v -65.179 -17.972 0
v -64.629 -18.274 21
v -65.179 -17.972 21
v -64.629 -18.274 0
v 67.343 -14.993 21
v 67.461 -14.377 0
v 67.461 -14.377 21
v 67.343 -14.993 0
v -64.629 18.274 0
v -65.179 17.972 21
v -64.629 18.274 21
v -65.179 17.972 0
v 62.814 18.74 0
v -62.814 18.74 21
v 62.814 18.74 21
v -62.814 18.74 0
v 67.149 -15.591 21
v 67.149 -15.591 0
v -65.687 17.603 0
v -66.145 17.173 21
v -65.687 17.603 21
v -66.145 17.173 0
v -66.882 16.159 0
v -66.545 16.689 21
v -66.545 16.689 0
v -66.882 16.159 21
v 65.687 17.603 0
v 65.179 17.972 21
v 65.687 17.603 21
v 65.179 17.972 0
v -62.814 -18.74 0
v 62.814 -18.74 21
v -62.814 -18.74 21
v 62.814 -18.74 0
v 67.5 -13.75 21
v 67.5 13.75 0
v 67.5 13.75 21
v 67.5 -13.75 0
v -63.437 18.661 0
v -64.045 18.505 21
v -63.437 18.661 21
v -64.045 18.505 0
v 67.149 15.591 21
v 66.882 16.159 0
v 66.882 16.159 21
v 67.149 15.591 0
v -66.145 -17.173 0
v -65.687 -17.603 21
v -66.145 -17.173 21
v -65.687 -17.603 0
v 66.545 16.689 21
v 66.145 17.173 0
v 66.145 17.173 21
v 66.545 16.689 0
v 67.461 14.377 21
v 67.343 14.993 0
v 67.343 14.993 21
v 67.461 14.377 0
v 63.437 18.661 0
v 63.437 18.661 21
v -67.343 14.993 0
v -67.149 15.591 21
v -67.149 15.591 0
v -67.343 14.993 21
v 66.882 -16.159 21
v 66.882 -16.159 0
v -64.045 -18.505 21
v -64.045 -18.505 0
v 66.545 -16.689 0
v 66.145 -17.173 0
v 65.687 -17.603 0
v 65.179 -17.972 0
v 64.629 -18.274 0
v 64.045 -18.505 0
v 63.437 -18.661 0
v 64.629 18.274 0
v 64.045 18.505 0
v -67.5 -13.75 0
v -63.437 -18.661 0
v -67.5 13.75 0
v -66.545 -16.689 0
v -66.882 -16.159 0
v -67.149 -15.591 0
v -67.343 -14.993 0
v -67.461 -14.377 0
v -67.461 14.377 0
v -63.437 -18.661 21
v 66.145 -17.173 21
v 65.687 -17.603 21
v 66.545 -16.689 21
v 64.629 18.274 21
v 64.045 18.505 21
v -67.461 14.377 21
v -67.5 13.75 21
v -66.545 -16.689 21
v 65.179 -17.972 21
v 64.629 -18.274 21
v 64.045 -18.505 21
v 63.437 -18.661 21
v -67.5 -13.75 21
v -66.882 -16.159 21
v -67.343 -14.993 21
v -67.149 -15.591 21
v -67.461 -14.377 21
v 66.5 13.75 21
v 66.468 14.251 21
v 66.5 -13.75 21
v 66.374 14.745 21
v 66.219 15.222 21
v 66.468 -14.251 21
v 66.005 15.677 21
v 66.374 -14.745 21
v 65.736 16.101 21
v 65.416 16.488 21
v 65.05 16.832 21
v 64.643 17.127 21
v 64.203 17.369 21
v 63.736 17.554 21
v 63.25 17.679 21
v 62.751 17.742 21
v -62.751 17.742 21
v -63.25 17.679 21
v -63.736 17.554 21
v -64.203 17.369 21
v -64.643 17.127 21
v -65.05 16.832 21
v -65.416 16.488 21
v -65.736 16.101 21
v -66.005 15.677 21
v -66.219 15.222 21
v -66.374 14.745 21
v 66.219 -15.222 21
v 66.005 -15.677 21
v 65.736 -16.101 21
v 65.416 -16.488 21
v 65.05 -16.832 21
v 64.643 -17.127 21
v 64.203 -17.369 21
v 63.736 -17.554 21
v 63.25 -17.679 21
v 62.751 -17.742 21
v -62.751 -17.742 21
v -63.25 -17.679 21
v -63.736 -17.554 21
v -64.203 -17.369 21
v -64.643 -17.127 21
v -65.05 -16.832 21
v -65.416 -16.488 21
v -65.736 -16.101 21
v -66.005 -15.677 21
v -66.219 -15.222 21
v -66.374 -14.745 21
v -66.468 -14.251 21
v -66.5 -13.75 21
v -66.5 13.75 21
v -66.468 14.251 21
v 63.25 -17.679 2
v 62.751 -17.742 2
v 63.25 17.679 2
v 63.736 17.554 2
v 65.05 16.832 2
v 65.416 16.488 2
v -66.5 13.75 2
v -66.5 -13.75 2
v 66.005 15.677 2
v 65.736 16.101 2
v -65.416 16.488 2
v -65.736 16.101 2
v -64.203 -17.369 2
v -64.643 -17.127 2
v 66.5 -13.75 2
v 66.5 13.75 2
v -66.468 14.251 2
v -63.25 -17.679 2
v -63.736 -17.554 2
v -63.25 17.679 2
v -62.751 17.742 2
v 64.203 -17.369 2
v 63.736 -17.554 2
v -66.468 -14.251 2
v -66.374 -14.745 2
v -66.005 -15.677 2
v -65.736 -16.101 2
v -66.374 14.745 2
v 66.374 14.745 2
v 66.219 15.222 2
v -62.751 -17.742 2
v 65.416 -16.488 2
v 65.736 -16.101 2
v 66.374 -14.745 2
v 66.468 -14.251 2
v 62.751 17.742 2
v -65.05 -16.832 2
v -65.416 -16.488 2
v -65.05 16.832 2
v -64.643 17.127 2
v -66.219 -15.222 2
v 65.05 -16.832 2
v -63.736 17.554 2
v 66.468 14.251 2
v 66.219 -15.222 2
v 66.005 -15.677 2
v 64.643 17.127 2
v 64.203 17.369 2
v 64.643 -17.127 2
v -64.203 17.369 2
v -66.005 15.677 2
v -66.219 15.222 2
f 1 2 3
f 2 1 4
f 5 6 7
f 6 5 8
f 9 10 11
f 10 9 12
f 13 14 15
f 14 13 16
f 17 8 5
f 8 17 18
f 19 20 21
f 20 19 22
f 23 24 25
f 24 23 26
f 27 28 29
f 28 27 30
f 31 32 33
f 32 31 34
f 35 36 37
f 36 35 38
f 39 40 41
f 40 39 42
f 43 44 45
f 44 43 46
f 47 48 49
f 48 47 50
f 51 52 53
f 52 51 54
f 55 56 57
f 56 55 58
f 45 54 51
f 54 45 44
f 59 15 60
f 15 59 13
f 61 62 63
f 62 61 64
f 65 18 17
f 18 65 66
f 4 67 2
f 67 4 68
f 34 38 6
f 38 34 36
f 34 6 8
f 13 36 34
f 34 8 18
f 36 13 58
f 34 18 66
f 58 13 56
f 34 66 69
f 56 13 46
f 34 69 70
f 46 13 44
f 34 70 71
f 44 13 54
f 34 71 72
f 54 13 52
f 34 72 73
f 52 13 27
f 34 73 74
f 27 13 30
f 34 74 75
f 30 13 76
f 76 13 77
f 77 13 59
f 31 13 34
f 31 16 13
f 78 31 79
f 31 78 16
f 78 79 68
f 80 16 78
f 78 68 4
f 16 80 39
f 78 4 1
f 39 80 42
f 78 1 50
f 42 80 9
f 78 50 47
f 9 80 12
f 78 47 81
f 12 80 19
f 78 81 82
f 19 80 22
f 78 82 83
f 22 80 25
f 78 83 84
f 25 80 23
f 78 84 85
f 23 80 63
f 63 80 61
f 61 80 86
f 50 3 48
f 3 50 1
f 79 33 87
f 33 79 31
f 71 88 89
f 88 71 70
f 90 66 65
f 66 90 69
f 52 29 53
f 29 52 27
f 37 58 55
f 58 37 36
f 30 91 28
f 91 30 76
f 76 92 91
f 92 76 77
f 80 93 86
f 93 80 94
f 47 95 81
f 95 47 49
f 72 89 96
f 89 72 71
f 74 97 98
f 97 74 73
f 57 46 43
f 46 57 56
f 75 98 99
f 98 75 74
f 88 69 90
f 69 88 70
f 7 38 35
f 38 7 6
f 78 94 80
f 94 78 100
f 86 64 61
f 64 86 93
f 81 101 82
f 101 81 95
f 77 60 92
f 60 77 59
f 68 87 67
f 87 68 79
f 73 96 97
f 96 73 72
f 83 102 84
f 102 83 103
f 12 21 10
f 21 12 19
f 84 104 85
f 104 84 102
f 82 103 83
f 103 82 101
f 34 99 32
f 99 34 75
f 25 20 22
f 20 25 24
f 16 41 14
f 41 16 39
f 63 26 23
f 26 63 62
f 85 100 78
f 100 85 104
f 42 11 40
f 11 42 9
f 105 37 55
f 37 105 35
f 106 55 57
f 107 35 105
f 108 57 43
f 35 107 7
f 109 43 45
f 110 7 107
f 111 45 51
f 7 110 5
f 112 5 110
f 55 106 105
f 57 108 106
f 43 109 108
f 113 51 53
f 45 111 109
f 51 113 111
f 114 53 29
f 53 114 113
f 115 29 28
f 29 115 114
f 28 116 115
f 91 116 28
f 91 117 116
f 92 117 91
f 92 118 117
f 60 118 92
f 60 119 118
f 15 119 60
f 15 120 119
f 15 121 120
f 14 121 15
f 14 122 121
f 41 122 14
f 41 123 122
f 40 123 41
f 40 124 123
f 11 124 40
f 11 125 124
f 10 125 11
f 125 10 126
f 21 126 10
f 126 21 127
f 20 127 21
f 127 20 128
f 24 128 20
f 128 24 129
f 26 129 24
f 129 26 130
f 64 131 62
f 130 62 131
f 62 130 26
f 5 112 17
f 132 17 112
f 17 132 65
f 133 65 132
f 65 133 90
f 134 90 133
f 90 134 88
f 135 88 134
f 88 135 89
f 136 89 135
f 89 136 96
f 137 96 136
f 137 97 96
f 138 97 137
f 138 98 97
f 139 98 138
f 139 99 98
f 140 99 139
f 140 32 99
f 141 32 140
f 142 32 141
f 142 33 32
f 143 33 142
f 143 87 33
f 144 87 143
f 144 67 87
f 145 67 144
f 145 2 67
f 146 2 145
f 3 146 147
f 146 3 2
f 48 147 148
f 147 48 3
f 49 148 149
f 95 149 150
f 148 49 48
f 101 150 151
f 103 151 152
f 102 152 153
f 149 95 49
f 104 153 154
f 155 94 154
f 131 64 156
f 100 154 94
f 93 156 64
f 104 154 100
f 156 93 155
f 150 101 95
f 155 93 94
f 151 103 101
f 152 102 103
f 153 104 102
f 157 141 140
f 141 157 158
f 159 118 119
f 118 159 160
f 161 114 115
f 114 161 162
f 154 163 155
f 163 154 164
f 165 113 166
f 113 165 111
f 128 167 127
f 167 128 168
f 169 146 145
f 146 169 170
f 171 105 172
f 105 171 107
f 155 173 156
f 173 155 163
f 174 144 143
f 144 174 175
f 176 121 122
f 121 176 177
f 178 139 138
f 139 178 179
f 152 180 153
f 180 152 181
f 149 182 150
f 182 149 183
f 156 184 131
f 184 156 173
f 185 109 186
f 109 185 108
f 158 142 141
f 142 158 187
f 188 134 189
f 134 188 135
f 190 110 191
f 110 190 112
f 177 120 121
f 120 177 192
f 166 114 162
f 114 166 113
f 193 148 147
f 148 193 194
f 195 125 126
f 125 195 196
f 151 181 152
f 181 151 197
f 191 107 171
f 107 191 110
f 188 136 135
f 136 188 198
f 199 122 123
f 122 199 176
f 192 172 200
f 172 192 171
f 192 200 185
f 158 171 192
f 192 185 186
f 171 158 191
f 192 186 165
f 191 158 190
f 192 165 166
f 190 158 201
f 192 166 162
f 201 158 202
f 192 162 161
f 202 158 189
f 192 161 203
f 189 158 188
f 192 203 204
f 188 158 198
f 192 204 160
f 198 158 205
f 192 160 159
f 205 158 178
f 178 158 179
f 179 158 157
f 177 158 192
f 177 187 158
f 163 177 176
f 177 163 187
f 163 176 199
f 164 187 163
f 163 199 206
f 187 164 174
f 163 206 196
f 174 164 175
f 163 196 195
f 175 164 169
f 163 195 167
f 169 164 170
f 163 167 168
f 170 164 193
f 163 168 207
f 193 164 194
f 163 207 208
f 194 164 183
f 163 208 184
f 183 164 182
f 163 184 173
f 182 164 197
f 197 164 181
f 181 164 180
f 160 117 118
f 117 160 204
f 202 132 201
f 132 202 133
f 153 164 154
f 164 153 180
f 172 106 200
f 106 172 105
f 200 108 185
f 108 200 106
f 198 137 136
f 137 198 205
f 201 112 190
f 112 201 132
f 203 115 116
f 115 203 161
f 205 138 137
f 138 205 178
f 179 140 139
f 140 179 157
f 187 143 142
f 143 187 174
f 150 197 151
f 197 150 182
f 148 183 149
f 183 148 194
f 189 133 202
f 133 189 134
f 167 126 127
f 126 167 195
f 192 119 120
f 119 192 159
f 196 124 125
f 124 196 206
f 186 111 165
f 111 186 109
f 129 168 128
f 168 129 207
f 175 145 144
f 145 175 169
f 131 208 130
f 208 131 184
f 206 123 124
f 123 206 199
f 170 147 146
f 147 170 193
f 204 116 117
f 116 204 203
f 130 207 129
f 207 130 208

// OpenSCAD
$fn = 50;


difference() {
	union() {
		hull() {
			translate(v = [-62.5000000000, 13.7500000000, 0]) {
				cylinder(h = 21, r = 5);
			}
			translate(v = [62.5000000000, 13.7500000000, 0]) {
				cylinder(h = 21, r = 5);
			}
			translate(v = [-62.5000000000, -13.7500000000, 0]) {
				cylinder(h = 21, r = 5);
			}
			translate(v = [62.5000000000, -13.7500000000, 0]) {
				cylinder(h = 21, r = 5);
			}
		}
	}
	union() {
		translate(v = [0, 0, 2]) {
			hull() {
				translate(v = [-62.5000000000, 13.7500000000, 0]) {
					cylinder(h = 19, r = 4);
				}
				translate(v = [62.5000000000, 13.7500000000, 0]) {
					cylinder(h = 19, r = 4);
				}
				translate(v = [-62.5000000000, -13.7500000000, 0]) {
					cylinder(h = 19, r = 4);
				}
				translate(v = [62.5000000000, -13.7500000000, 0]) {
					cylinder(h = 19, r = 4);
				}
			}
		}
	}
}
